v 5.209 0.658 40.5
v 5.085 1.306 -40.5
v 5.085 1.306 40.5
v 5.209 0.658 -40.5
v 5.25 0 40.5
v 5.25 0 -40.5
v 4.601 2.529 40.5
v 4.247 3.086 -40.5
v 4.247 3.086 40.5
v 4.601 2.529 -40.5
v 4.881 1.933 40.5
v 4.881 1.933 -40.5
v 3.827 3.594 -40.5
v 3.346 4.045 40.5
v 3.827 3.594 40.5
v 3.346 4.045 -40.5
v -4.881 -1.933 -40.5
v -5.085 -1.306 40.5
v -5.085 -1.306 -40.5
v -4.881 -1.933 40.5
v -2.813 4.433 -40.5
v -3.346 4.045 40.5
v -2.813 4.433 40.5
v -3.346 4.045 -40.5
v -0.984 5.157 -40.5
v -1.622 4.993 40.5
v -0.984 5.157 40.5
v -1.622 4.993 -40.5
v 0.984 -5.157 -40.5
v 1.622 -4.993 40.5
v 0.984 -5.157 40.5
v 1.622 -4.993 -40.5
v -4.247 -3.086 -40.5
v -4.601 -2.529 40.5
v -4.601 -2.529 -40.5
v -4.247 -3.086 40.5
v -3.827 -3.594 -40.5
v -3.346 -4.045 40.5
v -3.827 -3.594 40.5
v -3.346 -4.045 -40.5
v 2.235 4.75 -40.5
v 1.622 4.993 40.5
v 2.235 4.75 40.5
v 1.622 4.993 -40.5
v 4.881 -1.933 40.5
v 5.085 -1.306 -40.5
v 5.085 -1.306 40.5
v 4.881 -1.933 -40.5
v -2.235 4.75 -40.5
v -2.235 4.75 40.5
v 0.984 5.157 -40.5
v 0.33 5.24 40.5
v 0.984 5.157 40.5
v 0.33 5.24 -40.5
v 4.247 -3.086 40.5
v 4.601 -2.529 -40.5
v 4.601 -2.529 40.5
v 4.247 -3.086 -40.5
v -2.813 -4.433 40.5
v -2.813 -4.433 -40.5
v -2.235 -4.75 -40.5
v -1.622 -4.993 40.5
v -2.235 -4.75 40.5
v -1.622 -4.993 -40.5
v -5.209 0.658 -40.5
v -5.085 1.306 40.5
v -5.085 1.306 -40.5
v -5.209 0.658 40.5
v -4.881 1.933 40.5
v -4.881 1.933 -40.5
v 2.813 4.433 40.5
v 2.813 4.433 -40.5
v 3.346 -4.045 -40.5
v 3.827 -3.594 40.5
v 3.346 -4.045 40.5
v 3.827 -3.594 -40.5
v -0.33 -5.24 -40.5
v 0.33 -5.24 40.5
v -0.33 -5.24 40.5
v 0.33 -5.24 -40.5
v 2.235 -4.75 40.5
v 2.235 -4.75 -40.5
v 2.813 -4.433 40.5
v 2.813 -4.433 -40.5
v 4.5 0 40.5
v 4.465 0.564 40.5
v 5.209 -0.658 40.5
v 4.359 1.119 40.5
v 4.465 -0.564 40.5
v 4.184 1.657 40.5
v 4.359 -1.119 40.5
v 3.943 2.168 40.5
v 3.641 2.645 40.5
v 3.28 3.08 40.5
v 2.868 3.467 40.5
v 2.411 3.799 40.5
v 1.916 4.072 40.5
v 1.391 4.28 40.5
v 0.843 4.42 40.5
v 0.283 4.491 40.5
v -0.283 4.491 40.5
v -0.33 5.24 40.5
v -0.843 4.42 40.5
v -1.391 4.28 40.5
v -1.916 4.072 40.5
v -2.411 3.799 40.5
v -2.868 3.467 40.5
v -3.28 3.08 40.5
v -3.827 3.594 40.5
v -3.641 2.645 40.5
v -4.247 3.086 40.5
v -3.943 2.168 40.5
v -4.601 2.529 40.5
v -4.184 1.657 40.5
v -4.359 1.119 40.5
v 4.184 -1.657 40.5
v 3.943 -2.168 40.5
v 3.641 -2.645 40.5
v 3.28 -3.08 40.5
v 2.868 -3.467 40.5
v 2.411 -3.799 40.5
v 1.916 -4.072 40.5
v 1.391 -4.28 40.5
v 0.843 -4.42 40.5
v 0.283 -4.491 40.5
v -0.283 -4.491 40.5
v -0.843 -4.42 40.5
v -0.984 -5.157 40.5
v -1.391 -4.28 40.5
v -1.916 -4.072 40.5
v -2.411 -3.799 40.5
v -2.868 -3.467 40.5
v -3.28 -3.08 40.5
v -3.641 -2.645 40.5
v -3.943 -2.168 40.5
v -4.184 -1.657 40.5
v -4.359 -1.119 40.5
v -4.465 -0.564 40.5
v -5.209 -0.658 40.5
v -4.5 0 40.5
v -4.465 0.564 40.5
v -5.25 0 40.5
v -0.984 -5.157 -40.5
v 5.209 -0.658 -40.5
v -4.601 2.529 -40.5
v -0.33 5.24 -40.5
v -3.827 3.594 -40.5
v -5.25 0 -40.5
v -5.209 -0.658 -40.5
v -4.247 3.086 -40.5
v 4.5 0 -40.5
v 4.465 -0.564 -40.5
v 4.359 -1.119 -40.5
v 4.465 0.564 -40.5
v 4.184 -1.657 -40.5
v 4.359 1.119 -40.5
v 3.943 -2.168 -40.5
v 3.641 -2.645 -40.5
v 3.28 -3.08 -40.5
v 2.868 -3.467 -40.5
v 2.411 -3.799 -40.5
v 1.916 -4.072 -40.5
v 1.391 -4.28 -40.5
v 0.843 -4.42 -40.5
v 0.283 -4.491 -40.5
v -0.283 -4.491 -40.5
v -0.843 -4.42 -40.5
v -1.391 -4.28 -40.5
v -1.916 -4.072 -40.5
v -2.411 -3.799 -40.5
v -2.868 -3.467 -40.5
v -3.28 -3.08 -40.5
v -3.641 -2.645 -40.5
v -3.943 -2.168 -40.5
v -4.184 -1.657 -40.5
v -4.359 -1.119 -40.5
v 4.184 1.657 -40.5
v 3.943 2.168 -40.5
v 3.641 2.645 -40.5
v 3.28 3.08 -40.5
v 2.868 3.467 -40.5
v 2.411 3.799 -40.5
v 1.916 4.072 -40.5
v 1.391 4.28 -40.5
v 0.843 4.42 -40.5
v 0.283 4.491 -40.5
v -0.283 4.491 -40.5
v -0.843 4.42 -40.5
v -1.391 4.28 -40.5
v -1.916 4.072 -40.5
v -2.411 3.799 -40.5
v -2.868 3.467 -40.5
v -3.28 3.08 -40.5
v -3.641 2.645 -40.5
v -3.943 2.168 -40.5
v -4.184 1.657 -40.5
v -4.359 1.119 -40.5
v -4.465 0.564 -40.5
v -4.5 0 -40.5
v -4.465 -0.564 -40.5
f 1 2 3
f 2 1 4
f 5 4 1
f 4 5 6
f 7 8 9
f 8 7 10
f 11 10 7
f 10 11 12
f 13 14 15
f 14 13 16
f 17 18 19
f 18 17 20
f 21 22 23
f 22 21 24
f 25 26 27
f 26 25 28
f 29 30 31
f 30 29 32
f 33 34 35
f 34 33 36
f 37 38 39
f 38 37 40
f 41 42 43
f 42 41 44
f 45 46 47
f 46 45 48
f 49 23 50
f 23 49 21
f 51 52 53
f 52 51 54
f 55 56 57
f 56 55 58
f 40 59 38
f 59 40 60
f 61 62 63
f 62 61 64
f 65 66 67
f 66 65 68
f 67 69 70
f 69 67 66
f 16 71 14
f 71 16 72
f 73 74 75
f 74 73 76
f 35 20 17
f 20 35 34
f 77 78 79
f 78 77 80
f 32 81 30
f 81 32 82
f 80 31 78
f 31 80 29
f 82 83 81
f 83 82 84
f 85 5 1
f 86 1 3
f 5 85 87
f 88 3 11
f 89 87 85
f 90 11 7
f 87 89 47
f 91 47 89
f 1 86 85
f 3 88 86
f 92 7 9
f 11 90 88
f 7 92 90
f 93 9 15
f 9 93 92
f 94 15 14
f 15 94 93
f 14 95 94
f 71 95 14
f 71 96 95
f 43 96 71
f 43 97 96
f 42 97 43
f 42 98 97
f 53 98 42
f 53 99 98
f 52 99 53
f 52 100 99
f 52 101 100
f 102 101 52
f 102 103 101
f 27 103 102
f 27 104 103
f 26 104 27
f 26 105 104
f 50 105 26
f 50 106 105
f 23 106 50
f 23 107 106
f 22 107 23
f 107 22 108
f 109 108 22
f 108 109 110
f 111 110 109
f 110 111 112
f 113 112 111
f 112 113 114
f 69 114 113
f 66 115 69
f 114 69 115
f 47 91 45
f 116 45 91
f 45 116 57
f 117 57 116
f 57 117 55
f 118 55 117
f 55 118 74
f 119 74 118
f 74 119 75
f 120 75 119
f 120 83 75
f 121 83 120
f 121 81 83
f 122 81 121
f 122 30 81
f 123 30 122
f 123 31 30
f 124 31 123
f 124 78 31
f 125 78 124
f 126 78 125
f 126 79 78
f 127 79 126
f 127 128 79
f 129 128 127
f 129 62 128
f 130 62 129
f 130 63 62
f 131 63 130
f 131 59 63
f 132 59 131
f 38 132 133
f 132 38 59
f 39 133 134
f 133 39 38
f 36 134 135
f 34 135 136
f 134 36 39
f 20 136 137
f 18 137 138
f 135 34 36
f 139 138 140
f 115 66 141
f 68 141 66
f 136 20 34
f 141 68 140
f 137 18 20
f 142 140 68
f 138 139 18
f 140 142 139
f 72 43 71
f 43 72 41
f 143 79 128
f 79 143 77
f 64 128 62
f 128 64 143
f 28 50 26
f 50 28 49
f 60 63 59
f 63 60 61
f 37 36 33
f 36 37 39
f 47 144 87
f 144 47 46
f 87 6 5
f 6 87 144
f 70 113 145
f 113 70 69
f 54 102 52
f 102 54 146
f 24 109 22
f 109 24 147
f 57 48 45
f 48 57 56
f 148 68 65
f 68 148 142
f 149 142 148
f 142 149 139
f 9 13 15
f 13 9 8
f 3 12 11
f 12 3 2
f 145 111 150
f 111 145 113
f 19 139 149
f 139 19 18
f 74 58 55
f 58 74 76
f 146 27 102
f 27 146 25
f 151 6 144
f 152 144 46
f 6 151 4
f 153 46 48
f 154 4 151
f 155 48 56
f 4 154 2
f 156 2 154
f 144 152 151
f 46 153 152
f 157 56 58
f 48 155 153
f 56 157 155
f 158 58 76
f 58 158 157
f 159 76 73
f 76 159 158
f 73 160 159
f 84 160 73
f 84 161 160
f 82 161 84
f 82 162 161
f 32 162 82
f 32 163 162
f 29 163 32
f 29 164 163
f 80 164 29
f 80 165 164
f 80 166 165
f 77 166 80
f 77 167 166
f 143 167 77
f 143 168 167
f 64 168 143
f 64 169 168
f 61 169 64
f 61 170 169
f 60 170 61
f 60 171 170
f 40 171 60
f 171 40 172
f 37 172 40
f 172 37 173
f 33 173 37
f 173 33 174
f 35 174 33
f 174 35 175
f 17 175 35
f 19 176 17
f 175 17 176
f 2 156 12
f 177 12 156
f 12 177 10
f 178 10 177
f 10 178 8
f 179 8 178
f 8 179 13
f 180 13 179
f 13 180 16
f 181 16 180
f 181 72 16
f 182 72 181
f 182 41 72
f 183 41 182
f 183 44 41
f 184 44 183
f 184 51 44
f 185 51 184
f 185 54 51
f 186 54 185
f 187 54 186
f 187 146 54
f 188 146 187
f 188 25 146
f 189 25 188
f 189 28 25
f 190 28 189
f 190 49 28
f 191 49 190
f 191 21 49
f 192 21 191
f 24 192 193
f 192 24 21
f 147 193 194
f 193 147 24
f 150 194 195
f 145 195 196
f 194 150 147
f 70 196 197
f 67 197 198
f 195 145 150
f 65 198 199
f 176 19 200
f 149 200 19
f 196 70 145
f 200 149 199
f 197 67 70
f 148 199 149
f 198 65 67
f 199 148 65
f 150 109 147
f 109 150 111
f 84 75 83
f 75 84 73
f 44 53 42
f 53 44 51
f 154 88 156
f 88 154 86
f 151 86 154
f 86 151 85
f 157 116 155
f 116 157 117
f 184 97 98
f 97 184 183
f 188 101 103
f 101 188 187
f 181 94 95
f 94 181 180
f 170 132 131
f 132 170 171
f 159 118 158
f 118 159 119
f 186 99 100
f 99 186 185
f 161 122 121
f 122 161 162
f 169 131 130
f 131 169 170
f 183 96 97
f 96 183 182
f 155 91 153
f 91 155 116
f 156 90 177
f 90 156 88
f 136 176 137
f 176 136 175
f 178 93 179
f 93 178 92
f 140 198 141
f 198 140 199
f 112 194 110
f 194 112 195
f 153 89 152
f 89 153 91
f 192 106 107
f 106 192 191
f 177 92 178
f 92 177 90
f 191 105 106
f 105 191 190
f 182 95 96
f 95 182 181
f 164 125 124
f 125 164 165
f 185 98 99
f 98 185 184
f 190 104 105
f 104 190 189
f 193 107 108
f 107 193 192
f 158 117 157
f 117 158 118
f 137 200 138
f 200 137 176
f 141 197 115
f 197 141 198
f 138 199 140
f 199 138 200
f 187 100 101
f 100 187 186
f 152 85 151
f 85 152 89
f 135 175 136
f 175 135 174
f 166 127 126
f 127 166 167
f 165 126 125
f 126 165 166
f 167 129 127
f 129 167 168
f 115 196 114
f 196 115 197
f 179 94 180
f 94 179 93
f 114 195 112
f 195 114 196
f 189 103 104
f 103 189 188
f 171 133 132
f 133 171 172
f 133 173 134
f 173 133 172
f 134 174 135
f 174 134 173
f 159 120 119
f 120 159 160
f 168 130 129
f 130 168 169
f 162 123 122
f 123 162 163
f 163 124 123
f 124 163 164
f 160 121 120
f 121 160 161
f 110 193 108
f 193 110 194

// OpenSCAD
$fn = 50;


difference() {
	union() {
		translate(v = [0, 0, -40.5000000000]) {
			cylinder(h = 81, r = 5.2500000000);
		}
	}
	union() {
		translate(v = [0, 0, -100.0000000000]) {
			cylinder(h = 200, r = 4.5000000000);
		}
	}
}
